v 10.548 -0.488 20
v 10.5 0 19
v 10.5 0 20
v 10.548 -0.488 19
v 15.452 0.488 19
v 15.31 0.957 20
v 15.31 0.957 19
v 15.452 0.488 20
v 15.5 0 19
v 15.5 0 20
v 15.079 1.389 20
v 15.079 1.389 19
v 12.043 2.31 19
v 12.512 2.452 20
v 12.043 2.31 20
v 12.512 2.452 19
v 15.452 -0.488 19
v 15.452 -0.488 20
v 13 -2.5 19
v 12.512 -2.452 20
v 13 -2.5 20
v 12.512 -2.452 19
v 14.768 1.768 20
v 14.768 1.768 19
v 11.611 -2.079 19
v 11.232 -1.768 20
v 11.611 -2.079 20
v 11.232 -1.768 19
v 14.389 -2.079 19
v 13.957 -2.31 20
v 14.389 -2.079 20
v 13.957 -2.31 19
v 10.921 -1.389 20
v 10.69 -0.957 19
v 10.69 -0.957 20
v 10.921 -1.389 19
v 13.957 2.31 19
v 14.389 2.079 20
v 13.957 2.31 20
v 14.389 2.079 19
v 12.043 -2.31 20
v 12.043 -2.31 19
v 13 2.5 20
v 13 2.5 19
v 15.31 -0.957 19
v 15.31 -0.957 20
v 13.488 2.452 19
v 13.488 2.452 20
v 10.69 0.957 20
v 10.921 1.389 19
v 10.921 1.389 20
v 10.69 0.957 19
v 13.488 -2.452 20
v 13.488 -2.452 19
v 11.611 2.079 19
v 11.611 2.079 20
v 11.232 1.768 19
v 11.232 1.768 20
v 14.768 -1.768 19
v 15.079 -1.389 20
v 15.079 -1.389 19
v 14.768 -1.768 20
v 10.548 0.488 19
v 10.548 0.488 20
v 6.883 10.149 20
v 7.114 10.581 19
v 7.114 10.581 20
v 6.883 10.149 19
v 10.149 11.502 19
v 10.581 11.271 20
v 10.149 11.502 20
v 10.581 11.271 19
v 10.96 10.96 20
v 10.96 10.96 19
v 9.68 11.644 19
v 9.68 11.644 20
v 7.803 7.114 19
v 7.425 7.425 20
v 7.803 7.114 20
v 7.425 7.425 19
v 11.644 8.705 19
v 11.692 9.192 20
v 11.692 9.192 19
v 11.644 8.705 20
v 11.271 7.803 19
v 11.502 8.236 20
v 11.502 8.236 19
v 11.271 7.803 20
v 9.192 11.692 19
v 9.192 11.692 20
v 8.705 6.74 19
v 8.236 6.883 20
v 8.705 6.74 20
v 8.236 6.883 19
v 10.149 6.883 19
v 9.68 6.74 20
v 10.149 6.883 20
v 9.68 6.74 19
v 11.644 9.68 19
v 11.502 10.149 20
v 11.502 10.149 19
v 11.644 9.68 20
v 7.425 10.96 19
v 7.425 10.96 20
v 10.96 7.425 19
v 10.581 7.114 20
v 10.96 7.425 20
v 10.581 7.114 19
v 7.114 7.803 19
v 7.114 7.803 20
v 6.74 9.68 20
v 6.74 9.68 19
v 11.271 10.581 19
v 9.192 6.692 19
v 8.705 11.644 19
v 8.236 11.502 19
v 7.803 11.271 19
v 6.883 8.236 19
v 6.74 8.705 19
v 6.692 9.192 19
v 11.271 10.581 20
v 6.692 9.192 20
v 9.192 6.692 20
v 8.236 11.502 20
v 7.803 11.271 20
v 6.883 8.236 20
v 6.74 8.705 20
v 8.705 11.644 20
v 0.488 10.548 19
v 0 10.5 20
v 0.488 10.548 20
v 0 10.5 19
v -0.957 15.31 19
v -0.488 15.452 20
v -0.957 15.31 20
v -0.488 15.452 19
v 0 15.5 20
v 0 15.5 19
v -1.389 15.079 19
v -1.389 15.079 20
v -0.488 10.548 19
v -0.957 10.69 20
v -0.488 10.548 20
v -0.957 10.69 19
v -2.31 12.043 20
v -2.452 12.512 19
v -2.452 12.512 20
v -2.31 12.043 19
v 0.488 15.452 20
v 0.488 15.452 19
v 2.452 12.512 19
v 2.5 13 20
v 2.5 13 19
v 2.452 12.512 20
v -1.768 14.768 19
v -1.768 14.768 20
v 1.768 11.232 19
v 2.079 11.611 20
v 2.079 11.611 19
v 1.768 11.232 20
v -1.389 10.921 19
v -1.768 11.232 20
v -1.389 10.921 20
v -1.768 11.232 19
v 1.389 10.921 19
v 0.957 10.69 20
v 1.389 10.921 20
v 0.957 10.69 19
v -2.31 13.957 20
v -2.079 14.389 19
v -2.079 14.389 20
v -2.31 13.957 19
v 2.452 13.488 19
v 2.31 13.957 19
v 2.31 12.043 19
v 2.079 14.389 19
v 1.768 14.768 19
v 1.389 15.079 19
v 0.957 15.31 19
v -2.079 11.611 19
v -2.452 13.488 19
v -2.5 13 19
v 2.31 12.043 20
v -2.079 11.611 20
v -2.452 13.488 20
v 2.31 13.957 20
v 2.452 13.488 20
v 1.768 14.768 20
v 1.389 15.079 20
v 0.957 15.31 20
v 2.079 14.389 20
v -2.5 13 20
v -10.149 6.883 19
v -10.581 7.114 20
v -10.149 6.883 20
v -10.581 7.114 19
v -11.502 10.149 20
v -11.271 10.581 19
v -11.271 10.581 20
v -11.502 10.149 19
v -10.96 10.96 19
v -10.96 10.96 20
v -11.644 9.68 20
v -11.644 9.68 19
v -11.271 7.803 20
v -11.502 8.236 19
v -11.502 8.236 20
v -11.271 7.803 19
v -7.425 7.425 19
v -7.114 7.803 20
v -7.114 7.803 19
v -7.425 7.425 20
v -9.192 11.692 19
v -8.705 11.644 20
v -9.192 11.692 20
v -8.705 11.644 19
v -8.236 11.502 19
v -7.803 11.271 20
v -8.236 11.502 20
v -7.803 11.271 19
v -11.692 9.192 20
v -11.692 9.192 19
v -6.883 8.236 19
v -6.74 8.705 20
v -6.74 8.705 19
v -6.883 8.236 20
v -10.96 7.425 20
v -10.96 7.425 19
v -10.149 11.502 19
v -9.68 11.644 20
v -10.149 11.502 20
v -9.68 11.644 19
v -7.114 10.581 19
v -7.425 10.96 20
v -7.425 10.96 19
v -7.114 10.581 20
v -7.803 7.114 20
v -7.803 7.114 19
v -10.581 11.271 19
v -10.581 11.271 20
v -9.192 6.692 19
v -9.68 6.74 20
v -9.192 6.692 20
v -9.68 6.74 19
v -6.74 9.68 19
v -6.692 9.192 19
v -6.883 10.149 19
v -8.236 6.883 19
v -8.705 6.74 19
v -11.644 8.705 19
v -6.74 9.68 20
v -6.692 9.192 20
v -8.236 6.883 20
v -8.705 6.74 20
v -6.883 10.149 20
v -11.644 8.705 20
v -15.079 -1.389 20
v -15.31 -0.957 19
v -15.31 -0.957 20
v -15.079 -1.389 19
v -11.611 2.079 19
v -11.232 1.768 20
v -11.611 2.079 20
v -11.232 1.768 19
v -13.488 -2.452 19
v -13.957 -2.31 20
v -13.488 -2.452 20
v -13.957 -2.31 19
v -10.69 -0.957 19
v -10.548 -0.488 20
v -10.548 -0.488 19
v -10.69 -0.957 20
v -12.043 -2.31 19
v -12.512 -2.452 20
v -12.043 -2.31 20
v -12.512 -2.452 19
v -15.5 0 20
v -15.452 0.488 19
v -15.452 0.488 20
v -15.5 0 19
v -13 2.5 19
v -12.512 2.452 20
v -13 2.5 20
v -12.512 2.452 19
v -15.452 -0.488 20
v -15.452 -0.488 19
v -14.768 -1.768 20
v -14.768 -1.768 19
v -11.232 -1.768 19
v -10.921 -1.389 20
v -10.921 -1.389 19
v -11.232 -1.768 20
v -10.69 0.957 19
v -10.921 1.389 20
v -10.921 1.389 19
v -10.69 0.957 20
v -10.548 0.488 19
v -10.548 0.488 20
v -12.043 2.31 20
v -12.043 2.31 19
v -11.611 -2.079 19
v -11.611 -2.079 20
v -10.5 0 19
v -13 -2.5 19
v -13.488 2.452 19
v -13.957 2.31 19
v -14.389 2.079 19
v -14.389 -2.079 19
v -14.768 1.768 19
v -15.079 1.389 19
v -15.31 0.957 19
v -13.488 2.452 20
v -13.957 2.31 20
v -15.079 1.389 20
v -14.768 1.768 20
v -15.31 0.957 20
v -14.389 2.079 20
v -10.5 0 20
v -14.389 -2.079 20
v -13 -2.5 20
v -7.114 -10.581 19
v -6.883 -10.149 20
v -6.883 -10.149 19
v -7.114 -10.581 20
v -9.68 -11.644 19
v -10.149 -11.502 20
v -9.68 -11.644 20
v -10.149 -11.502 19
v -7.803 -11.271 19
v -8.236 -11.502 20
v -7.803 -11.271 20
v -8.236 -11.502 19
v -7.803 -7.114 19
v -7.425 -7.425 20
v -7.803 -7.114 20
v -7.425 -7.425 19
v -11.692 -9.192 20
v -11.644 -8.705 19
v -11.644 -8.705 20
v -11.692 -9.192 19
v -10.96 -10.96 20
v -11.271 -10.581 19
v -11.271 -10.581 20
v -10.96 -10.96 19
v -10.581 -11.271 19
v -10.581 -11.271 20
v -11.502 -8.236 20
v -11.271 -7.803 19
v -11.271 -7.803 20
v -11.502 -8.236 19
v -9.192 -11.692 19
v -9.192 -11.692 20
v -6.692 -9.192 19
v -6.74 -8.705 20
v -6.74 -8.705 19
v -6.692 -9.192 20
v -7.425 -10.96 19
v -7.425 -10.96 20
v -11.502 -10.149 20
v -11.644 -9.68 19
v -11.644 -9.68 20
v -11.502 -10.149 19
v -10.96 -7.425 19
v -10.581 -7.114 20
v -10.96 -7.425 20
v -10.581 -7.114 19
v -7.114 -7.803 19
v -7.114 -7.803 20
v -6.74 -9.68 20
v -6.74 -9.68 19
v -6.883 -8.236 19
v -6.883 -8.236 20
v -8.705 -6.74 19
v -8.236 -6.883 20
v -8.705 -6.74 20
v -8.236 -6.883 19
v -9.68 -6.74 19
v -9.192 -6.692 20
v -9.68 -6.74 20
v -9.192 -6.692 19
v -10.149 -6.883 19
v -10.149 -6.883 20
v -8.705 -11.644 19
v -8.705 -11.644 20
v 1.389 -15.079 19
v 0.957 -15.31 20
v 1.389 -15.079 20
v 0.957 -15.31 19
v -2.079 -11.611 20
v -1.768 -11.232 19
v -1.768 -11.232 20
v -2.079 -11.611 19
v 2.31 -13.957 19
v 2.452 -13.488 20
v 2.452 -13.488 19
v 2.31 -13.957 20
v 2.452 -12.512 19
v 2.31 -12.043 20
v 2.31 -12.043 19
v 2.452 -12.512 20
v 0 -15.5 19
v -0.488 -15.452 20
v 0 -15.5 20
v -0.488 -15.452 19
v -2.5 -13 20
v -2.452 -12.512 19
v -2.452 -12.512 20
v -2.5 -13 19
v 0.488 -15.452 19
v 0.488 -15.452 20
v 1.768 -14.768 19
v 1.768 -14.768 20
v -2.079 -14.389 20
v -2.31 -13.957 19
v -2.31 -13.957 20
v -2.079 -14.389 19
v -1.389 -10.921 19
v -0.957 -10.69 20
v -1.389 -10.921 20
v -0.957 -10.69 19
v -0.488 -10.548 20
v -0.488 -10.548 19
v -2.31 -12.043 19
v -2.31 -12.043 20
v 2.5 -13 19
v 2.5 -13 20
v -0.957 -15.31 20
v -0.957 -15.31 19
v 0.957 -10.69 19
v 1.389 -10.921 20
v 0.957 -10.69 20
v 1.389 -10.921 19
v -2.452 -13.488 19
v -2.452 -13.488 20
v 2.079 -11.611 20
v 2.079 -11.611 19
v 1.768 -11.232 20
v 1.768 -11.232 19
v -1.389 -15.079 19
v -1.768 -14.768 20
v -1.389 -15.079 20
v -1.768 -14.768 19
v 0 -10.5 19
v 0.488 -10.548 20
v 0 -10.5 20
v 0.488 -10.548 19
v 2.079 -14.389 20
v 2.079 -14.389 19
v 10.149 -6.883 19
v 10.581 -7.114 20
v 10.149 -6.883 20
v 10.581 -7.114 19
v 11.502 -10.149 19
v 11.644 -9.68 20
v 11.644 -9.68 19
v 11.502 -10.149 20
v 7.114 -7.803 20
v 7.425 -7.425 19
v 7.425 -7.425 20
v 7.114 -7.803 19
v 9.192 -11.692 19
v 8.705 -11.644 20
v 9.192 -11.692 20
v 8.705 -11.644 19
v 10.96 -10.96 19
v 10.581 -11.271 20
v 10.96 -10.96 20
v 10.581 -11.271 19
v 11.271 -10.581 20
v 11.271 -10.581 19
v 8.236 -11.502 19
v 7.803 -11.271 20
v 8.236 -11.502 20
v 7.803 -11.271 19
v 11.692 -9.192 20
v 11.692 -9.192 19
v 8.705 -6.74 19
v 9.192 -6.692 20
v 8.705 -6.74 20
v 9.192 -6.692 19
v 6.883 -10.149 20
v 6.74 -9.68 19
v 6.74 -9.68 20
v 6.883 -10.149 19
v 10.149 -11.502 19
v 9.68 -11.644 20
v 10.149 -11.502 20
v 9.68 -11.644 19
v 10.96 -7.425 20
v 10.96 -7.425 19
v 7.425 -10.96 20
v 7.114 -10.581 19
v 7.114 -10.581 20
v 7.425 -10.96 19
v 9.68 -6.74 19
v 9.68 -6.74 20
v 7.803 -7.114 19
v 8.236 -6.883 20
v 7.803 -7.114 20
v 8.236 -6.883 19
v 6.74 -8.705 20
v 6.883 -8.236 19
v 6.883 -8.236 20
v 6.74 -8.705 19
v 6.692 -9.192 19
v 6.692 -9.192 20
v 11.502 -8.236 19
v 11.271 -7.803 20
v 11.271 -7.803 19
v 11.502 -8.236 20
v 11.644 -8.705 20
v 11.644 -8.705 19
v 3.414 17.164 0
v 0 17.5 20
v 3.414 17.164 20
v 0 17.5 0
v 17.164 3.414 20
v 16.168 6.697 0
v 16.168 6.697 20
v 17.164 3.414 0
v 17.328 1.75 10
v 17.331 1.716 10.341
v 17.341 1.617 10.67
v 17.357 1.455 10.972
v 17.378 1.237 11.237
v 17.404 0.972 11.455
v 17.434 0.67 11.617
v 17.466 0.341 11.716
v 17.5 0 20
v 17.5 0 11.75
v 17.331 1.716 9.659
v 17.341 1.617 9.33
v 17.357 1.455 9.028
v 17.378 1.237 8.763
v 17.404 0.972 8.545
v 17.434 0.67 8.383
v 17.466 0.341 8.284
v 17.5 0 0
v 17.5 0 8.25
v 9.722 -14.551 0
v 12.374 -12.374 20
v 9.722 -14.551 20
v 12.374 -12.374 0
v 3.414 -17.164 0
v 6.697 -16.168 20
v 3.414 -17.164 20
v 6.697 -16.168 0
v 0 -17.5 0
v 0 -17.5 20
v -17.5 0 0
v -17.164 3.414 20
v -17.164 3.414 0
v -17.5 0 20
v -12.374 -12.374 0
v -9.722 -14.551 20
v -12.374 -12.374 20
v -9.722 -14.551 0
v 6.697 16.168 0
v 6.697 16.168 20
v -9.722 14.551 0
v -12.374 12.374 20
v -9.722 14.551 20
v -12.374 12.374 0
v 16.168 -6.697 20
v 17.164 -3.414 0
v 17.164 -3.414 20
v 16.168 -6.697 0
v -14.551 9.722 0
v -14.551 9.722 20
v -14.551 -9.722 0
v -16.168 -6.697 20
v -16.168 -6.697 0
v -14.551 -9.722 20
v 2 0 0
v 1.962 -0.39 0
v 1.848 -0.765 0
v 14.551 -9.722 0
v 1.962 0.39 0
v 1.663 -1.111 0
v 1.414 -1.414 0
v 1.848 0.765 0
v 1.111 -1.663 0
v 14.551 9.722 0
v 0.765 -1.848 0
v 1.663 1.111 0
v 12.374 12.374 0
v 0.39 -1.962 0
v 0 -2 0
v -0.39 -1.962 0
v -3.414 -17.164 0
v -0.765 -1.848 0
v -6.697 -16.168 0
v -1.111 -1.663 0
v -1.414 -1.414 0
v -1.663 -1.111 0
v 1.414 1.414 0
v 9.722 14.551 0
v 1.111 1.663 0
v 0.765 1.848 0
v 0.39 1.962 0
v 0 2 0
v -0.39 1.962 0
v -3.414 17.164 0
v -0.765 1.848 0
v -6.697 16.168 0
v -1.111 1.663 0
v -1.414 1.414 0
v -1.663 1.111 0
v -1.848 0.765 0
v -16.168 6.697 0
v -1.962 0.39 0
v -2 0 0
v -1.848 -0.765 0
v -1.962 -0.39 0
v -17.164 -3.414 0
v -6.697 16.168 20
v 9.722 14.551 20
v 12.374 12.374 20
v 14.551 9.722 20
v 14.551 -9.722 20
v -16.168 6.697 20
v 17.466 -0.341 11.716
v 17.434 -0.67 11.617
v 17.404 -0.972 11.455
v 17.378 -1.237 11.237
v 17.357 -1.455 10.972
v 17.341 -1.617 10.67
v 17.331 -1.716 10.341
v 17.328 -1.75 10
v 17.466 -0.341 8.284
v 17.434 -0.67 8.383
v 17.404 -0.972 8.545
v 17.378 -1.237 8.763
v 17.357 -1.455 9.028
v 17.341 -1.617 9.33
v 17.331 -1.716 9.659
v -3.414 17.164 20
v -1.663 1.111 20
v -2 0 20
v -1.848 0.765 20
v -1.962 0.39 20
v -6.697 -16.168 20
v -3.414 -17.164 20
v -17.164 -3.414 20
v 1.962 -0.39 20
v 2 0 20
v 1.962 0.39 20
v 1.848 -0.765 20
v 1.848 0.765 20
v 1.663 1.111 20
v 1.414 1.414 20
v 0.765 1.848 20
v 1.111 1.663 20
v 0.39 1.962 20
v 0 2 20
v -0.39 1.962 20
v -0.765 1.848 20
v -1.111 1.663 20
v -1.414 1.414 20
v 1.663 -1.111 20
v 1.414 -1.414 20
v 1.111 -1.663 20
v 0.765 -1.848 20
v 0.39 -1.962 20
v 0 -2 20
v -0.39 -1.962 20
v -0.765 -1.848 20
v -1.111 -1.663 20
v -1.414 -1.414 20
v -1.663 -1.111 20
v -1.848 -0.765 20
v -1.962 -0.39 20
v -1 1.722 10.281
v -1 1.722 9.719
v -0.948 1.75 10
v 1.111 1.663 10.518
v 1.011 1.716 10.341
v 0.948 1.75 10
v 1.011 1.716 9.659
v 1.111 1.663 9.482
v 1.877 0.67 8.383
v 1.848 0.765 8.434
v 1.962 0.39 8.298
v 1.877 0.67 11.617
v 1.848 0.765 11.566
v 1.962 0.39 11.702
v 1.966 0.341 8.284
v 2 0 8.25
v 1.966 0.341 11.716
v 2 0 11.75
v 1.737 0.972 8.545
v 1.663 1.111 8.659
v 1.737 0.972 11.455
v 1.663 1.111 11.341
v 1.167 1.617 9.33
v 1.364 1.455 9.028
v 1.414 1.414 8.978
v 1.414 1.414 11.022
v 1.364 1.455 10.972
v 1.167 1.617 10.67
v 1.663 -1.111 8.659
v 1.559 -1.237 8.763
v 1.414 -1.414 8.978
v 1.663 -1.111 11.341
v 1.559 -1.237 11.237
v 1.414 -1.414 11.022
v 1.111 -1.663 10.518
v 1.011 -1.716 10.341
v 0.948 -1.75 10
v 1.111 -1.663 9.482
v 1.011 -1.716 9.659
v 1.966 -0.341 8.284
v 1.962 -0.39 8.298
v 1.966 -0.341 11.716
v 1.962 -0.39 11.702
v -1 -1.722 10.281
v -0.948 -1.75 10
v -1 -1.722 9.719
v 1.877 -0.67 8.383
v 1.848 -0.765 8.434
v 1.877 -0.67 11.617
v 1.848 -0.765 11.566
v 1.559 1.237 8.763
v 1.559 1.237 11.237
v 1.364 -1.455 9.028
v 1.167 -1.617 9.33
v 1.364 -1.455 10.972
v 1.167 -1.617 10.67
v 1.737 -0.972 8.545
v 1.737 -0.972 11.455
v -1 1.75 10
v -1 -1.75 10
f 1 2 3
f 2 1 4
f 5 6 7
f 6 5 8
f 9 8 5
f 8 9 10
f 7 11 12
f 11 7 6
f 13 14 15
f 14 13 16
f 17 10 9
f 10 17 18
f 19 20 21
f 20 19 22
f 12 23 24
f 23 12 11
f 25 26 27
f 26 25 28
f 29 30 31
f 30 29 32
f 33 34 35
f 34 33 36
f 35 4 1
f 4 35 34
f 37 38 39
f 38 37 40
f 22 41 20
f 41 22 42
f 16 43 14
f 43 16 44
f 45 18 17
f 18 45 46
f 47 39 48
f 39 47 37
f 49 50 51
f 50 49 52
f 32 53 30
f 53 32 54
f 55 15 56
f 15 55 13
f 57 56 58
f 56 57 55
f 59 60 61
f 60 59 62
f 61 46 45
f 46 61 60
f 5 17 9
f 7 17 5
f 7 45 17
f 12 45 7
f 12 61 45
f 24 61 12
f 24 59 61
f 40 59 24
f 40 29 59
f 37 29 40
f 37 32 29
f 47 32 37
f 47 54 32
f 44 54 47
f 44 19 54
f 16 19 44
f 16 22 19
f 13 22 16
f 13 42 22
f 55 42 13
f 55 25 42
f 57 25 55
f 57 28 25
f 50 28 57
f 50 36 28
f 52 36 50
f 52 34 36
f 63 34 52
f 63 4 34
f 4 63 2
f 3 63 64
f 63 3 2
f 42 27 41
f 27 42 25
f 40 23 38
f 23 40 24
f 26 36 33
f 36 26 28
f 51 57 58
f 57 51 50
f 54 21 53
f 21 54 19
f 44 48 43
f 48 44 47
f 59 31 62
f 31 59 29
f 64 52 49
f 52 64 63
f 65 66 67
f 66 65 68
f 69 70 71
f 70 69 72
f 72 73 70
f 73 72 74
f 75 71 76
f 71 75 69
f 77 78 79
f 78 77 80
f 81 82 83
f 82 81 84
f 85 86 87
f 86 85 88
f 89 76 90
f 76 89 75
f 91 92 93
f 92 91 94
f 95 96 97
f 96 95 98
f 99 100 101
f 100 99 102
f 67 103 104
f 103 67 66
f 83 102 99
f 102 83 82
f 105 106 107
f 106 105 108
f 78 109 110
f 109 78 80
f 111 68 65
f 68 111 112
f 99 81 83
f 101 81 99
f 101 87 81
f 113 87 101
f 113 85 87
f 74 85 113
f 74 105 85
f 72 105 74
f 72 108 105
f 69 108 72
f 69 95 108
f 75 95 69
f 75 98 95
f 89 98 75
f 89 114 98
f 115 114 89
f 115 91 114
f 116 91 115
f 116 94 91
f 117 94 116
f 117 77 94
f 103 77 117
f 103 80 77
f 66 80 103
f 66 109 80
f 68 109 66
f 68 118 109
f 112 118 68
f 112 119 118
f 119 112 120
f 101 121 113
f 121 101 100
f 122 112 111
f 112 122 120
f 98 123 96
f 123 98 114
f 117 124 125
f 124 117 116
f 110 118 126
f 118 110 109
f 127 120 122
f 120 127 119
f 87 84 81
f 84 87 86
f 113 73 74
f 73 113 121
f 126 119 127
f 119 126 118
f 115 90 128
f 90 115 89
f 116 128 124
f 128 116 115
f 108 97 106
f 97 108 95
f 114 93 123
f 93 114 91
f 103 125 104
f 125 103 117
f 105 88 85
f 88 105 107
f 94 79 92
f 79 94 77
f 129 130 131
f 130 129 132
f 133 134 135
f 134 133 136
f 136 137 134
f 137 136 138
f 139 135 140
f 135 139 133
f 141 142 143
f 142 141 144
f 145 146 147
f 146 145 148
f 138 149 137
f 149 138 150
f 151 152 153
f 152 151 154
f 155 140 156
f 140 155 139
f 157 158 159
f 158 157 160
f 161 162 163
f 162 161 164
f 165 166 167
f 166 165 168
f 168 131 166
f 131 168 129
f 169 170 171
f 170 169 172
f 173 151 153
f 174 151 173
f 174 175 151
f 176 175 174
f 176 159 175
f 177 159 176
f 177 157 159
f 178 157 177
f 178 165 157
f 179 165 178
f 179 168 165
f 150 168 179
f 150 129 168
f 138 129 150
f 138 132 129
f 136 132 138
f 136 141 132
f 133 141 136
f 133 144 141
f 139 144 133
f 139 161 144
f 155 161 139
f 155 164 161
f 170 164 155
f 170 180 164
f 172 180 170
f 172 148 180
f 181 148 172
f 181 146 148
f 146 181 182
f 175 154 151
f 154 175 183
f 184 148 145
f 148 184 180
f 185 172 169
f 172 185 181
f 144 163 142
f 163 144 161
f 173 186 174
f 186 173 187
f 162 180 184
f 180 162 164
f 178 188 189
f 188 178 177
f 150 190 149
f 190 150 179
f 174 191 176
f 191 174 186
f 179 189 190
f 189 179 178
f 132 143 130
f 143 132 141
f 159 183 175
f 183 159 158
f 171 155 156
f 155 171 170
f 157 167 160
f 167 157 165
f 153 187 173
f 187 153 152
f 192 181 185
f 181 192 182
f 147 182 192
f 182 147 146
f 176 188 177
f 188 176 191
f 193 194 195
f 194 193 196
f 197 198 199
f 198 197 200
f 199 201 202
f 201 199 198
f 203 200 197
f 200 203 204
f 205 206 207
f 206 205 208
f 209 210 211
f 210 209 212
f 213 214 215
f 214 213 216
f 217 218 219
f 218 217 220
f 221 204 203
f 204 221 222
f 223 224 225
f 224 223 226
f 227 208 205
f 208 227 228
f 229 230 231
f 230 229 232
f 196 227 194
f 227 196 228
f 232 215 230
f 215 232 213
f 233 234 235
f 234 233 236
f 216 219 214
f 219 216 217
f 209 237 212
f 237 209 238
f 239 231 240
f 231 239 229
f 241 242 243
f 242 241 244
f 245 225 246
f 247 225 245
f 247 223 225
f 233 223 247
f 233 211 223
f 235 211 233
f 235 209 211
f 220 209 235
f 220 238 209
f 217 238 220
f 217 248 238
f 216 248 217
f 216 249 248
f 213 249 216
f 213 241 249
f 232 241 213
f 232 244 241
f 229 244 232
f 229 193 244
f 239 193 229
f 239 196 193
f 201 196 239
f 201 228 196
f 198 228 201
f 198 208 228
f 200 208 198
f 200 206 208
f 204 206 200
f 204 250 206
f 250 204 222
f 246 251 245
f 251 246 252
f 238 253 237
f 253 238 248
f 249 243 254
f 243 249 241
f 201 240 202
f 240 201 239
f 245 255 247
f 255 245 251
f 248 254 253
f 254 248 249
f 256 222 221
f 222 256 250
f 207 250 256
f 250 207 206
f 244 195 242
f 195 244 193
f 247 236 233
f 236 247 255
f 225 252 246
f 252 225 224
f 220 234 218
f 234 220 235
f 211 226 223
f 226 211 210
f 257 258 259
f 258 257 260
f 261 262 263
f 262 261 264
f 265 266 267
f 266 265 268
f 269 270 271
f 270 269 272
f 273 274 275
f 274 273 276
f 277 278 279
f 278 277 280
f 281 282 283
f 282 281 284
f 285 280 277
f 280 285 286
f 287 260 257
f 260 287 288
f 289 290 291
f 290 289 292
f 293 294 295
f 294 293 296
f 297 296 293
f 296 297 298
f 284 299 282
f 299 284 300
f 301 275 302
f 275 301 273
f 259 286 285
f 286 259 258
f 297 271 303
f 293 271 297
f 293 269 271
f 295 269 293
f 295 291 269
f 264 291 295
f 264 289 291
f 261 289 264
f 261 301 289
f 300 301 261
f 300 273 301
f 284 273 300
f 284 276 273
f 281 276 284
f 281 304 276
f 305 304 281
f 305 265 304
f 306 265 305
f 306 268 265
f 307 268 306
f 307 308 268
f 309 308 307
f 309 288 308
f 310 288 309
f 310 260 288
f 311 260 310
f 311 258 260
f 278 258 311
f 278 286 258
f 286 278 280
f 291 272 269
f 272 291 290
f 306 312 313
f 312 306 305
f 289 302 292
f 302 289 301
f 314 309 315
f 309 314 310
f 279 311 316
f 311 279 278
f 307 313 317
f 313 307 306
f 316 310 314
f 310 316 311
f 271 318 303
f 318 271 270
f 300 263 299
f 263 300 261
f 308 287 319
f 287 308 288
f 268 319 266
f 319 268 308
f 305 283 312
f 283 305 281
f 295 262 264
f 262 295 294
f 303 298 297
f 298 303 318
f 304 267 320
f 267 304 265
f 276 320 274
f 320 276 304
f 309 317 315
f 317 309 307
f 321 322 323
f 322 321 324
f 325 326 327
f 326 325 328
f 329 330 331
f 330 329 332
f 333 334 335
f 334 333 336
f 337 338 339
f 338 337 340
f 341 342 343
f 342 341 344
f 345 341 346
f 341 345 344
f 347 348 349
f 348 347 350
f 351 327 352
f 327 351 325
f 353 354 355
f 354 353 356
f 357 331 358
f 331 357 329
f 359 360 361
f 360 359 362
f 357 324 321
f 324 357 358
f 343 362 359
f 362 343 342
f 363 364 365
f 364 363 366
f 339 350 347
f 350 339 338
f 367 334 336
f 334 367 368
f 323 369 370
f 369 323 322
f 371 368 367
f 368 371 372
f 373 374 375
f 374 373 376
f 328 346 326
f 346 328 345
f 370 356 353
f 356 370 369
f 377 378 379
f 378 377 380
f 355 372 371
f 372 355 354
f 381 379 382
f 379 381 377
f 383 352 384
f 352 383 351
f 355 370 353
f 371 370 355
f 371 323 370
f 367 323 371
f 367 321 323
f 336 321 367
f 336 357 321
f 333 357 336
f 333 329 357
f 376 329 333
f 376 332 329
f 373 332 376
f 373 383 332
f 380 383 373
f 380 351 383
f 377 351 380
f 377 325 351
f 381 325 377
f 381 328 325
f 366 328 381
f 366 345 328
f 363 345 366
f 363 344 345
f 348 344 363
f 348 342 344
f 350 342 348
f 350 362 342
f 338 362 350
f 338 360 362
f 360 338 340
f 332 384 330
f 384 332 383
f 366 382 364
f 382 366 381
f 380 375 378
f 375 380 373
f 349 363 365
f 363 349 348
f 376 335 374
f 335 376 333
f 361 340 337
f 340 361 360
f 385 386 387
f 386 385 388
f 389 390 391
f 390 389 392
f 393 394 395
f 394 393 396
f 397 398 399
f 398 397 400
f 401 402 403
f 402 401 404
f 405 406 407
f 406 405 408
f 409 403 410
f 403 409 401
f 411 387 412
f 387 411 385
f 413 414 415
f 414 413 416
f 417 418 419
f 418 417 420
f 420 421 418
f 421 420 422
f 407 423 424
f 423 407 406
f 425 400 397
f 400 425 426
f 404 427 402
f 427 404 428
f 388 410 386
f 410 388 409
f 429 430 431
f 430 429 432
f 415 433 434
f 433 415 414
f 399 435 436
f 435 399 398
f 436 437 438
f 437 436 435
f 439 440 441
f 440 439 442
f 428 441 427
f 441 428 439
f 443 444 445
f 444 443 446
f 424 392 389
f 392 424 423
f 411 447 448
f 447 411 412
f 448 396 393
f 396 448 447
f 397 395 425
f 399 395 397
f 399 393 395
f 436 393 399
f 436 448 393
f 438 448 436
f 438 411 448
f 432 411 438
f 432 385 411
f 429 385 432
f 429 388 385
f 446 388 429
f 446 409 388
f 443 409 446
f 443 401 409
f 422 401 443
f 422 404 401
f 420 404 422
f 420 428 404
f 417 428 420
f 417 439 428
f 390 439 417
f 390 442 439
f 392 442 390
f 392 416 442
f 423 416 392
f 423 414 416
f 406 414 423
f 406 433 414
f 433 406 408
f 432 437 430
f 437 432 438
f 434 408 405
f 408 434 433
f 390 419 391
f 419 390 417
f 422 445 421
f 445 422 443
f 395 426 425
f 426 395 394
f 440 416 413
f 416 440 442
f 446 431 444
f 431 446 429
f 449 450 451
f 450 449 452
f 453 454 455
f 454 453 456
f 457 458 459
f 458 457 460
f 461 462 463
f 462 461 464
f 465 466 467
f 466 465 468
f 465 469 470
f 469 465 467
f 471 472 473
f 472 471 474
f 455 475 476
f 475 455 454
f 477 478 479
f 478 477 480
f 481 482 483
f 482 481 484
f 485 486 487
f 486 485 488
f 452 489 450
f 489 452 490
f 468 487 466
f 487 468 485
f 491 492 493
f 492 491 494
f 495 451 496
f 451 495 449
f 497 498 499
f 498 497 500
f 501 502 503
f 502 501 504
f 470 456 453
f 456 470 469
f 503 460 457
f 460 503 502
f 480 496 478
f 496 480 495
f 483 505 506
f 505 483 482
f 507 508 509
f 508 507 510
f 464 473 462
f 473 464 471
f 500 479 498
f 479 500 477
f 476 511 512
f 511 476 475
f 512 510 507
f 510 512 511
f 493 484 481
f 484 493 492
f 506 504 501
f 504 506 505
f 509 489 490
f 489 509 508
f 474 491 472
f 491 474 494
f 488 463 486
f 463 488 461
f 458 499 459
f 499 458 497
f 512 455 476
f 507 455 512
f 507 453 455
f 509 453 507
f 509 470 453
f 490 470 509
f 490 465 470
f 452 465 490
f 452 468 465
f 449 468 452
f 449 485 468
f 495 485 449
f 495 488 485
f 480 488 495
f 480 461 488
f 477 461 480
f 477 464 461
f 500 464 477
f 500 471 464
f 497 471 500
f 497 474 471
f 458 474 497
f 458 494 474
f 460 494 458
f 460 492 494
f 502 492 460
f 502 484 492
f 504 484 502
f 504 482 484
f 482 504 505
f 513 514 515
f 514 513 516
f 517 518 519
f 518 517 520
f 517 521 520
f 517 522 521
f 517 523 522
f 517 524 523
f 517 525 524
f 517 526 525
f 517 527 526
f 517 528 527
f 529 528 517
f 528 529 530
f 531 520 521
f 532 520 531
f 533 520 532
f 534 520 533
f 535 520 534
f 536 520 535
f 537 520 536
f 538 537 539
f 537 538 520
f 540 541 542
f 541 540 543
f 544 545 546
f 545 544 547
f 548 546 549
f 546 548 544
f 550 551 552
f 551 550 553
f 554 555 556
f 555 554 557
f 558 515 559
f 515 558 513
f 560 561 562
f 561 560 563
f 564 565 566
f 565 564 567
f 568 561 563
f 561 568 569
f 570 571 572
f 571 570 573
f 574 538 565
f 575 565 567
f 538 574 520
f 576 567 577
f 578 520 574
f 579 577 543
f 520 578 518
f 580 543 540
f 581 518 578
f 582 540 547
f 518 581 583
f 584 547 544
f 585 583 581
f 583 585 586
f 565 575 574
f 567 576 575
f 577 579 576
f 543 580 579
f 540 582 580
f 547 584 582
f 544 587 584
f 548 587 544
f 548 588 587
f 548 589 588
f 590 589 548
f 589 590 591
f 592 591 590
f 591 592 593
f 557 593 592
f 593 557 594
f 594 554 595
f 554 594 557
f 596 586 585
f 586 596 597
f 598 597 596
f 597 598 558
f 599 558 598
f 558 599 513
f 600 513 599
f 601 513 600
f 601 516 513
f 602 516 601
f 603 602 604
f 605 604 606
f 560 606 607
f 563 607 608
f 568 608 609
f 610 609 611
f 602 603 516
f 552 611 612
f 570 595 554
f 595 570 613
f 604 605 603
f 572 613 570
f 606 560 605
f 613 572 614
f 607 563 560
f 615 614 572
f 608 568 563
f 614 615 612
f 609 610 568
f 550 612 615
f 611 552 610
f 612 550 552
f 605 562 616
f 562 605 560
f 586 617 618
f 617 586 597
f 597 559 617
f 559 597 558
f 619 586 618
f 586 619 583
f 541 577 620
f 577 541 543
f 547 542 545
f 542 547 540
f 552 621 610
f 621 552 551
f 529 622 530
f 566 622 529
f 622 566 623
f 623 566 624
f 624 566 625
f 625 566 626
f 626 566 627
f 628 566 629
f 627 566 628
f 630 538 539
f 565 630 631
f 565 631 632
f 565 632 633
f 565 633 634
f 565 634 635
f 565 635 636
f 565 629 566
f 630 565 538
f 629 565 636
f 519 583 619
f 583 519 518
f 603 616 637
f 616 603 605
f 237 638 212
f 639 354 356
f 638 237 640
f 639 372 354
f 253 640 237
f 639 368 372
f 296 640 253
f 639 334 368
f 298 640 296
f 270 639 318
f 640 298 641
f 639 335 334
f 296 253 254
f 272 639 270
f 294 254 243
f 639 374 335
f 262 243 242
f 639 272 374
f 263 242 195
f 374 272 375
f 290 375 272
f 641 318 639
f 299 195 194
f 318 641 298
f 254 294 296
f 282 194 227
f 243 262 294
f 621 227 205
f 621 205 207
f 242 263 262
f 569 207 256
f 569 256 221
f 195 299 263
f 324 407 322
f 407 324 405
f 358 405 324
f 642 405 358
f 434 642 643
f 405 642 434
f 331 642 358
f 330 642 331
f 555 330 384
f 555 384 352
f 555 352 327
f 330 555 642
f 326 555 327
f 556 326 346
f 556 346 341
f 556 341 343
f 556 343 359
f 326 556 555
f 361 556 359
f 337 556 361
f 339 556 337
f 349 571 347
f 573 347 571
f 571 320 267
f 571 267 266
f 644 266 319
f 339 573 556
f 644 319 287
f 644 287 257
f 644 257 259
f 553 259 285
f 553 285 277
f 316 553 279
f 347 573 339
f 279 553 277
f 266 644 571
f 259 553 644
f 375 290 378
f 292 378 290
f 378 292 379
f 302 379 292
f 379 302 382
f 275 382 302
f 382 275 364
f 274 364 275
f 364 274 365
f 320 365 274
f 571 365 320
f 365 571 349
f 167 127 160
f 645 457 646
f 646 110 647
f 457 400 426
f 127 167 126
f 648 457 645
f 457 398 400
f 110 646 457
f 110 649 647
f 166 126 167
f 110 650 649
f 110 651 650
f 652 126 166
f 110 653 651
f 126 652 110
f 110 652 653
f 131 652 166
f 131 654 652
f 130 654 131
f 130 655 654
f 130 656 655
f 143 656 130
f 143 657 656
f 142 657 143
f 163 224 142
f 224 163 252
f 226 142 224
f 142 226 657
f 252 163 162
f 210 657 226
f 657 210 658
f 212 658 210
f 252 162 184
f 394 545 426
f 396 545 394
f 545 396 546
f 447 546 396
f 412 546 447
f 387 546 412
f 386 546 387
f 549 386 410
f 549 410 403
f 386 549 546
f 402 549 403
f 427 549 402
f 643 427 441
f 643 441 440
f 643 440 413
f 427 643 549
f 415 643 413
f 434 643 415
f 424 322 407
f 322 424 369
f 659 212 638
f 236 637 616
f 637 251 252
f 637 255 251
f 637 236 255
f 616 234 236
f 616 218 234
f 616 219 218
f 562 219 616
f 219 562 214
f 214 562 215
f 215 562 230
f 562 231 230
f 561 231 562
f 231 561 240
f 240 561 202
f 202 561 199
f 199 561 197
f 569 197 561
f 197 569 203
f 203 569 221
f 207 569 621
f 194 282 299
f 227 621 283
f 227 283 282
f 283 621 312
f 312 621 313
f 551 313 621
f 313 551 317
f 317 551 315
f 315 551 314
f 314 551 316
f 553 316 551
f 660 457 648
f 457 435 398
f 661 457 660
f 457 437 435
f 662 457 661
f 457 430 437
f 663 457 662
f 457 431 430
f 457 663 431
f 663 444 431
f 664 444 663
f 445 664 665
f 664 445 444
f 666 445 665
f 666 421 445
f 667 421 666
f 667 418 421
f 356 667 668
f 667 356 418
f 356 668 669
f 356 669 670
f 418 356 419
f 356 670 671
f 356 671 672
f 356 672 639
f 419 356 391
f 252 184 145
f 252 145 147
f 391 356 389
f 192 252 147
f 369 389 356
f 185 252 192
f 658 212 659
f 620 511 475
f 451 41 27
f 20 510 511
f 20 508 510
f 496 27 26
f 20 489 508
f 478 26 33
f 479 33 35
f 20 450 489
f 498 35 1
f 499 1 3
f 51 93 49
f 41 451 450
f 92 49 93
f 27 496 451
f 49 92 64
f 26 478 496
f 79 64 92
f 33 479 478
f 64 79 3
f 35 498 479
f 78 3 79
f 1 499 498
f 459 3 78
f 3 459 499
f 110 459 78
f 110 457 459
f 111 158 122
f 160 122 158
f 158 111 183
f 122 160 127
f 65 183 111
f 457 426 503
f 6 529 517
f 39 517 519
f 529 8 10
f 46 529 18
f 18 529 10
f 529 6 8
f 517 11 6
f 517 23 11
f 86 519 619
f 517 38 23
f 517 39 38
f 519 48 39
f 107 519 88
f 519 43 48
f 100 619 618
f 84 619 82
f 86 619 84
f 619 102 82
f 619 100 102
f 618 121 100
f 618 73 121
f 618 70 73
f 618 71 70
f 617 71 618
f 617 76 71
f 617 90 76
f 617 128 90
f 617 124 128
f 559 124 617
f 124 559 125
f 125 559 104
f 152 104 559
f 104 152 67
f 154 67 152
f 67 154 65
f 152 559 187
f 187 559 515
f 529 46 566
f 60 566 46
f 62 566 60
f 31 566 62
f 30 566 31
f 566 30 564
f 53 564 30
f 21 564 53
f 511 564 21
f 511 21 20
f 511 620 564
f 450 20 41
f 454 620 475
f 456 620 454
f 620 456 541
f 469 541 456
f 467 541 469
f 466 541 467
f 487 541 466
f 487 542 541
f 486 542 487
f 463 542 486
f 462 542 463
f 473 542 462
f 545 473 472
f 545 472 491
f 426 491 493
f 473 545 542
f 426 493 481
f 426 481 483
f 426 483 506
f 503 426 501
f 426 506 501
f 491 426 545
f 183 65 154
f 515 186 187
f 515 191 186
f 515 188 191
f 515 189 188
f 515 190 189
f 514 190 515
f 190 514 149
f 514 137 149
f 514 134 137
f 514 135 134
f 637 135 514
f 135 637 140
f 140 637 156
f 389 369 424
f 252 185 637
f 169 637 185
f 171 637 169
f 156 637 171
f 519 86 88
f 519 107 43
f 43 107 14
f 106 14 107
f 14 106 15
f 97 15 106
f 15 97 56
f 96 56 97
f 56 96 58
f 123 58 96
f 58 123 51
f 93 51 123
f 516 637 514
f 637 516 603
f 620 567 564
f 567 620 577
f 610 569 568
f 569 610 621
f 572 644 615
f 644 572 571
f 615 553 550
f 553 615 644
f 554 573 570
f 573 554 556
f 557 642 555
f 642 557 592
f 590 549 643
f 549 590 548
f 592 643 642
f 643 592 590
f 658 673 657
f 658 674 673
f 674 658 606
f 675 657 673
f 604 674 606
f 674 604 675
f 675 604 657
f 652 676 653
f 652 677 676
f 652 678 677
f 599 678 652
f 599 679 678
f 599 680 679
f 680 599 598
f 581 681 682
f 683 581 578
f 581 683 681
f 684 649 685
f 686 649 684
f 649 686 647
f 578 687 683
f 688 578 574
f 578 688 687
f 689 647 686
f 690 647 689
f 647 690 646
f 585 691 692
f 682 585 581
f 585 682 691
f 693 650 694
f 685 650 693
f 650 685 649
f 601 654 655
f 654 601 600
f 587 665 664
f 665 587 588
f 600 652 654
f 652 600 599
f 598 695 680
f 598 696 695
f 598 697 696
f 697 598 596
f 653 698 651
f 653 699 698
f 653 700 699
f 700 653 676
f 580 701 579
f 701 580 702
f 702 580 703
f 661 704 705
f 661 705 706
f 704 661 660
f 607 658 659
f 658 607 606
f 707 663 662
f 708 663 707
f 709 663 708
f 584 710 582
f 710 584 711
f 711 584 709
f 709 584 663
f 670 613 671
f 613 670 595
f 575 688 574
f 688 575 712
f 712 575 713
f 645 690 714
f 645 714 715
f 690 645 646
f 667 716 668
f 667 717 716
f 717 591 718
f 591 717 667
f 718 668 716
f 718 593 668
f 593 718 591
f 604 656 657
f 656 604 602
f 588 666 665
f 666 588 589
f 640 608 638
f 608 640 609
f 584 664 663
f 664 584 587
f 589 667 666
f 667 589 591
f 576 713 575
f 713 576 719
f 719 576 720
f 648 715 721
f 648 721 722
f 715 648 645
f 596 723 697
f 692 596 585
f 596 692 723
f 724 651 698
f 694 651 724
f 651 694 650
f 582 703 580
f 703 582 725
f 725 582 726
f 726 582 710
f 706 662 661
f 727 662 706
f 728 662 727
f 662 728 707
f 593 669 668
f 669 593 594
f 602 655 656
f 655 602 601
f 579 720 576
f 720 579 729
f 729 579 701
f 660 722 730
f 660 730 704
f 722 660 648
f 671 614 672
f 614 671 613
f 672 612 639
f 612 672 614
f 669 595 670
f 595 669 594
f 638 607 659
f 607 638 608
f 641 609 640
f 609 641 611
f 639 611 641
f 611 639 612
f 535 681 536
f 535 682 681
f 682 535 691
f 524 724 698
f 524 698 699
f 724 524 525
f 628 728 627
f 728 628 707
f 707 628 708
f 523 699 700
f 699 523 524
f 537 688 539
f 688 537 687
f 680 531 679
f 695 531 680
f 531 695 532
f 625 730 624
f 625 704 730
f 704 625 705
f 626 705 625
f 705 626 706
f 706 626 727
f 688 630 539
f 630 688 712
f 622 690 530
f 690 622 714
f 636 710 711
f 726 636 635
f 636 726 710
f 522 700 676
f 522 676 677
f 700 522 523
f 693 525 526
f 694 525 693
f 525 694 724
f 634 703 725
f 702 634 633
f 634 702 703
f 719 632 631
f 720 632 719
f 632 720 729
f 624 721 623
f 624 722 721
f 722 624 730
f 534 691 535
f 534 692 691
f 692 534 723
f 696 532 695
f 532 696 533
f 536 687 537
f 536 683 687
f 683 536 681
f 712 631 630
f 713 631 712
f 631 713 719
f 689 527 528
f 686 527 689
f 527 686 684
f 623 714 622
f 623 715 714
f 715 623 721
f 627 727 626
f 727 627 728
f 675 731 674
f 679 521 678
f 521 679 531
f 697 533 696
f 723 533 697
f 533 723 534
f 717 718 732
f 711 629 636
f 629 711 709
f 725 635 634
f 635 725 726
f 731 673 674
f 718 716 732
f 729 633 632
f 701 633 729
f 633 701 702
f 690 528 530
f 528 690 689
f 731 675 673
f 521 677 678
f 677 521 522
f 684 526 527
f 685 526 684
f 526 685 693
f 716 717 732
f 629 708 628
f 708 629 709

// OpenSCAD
$fn = 32;

// ----------------------------------------------------------------------
// Control knob: dimpled knob
// ----------------------------------------------------------------------

// --- parameters (mm) ---
dimp_d = 5;               // finger dimple diameter
n_dimp = 8;               // number of dimples
dimp_r = 13;              // dimple ring radius
knob_d = 35;              // knob body diameter
knob_h = 20;              // knob body height
bore_d = 4;               // shaft bore diameter
set_d = 3.5;              // set screw bore diameter

dimp_step = 360 / n_dimp;  // dimple angular step

difference() {
  cylinder(h = knob_h, d = knob_d);
  translate([0, 0, -1]) cylinder(h = knob_h + 2, d = bore_d);
  translate([-1, 0, knob_h / 2]) rotate([0, 90, 0])
    cylinder(h = knob_d / 2 + bore_d / 2 + 2, d = set_d);  for (i = [0 : n_dimp - 1])
    rotate([0, 0, i * dimp_step])
      translate([dimp_r, 0, knob_h - 1])
        cylinder(h = 2, d = dimp_d);
}
